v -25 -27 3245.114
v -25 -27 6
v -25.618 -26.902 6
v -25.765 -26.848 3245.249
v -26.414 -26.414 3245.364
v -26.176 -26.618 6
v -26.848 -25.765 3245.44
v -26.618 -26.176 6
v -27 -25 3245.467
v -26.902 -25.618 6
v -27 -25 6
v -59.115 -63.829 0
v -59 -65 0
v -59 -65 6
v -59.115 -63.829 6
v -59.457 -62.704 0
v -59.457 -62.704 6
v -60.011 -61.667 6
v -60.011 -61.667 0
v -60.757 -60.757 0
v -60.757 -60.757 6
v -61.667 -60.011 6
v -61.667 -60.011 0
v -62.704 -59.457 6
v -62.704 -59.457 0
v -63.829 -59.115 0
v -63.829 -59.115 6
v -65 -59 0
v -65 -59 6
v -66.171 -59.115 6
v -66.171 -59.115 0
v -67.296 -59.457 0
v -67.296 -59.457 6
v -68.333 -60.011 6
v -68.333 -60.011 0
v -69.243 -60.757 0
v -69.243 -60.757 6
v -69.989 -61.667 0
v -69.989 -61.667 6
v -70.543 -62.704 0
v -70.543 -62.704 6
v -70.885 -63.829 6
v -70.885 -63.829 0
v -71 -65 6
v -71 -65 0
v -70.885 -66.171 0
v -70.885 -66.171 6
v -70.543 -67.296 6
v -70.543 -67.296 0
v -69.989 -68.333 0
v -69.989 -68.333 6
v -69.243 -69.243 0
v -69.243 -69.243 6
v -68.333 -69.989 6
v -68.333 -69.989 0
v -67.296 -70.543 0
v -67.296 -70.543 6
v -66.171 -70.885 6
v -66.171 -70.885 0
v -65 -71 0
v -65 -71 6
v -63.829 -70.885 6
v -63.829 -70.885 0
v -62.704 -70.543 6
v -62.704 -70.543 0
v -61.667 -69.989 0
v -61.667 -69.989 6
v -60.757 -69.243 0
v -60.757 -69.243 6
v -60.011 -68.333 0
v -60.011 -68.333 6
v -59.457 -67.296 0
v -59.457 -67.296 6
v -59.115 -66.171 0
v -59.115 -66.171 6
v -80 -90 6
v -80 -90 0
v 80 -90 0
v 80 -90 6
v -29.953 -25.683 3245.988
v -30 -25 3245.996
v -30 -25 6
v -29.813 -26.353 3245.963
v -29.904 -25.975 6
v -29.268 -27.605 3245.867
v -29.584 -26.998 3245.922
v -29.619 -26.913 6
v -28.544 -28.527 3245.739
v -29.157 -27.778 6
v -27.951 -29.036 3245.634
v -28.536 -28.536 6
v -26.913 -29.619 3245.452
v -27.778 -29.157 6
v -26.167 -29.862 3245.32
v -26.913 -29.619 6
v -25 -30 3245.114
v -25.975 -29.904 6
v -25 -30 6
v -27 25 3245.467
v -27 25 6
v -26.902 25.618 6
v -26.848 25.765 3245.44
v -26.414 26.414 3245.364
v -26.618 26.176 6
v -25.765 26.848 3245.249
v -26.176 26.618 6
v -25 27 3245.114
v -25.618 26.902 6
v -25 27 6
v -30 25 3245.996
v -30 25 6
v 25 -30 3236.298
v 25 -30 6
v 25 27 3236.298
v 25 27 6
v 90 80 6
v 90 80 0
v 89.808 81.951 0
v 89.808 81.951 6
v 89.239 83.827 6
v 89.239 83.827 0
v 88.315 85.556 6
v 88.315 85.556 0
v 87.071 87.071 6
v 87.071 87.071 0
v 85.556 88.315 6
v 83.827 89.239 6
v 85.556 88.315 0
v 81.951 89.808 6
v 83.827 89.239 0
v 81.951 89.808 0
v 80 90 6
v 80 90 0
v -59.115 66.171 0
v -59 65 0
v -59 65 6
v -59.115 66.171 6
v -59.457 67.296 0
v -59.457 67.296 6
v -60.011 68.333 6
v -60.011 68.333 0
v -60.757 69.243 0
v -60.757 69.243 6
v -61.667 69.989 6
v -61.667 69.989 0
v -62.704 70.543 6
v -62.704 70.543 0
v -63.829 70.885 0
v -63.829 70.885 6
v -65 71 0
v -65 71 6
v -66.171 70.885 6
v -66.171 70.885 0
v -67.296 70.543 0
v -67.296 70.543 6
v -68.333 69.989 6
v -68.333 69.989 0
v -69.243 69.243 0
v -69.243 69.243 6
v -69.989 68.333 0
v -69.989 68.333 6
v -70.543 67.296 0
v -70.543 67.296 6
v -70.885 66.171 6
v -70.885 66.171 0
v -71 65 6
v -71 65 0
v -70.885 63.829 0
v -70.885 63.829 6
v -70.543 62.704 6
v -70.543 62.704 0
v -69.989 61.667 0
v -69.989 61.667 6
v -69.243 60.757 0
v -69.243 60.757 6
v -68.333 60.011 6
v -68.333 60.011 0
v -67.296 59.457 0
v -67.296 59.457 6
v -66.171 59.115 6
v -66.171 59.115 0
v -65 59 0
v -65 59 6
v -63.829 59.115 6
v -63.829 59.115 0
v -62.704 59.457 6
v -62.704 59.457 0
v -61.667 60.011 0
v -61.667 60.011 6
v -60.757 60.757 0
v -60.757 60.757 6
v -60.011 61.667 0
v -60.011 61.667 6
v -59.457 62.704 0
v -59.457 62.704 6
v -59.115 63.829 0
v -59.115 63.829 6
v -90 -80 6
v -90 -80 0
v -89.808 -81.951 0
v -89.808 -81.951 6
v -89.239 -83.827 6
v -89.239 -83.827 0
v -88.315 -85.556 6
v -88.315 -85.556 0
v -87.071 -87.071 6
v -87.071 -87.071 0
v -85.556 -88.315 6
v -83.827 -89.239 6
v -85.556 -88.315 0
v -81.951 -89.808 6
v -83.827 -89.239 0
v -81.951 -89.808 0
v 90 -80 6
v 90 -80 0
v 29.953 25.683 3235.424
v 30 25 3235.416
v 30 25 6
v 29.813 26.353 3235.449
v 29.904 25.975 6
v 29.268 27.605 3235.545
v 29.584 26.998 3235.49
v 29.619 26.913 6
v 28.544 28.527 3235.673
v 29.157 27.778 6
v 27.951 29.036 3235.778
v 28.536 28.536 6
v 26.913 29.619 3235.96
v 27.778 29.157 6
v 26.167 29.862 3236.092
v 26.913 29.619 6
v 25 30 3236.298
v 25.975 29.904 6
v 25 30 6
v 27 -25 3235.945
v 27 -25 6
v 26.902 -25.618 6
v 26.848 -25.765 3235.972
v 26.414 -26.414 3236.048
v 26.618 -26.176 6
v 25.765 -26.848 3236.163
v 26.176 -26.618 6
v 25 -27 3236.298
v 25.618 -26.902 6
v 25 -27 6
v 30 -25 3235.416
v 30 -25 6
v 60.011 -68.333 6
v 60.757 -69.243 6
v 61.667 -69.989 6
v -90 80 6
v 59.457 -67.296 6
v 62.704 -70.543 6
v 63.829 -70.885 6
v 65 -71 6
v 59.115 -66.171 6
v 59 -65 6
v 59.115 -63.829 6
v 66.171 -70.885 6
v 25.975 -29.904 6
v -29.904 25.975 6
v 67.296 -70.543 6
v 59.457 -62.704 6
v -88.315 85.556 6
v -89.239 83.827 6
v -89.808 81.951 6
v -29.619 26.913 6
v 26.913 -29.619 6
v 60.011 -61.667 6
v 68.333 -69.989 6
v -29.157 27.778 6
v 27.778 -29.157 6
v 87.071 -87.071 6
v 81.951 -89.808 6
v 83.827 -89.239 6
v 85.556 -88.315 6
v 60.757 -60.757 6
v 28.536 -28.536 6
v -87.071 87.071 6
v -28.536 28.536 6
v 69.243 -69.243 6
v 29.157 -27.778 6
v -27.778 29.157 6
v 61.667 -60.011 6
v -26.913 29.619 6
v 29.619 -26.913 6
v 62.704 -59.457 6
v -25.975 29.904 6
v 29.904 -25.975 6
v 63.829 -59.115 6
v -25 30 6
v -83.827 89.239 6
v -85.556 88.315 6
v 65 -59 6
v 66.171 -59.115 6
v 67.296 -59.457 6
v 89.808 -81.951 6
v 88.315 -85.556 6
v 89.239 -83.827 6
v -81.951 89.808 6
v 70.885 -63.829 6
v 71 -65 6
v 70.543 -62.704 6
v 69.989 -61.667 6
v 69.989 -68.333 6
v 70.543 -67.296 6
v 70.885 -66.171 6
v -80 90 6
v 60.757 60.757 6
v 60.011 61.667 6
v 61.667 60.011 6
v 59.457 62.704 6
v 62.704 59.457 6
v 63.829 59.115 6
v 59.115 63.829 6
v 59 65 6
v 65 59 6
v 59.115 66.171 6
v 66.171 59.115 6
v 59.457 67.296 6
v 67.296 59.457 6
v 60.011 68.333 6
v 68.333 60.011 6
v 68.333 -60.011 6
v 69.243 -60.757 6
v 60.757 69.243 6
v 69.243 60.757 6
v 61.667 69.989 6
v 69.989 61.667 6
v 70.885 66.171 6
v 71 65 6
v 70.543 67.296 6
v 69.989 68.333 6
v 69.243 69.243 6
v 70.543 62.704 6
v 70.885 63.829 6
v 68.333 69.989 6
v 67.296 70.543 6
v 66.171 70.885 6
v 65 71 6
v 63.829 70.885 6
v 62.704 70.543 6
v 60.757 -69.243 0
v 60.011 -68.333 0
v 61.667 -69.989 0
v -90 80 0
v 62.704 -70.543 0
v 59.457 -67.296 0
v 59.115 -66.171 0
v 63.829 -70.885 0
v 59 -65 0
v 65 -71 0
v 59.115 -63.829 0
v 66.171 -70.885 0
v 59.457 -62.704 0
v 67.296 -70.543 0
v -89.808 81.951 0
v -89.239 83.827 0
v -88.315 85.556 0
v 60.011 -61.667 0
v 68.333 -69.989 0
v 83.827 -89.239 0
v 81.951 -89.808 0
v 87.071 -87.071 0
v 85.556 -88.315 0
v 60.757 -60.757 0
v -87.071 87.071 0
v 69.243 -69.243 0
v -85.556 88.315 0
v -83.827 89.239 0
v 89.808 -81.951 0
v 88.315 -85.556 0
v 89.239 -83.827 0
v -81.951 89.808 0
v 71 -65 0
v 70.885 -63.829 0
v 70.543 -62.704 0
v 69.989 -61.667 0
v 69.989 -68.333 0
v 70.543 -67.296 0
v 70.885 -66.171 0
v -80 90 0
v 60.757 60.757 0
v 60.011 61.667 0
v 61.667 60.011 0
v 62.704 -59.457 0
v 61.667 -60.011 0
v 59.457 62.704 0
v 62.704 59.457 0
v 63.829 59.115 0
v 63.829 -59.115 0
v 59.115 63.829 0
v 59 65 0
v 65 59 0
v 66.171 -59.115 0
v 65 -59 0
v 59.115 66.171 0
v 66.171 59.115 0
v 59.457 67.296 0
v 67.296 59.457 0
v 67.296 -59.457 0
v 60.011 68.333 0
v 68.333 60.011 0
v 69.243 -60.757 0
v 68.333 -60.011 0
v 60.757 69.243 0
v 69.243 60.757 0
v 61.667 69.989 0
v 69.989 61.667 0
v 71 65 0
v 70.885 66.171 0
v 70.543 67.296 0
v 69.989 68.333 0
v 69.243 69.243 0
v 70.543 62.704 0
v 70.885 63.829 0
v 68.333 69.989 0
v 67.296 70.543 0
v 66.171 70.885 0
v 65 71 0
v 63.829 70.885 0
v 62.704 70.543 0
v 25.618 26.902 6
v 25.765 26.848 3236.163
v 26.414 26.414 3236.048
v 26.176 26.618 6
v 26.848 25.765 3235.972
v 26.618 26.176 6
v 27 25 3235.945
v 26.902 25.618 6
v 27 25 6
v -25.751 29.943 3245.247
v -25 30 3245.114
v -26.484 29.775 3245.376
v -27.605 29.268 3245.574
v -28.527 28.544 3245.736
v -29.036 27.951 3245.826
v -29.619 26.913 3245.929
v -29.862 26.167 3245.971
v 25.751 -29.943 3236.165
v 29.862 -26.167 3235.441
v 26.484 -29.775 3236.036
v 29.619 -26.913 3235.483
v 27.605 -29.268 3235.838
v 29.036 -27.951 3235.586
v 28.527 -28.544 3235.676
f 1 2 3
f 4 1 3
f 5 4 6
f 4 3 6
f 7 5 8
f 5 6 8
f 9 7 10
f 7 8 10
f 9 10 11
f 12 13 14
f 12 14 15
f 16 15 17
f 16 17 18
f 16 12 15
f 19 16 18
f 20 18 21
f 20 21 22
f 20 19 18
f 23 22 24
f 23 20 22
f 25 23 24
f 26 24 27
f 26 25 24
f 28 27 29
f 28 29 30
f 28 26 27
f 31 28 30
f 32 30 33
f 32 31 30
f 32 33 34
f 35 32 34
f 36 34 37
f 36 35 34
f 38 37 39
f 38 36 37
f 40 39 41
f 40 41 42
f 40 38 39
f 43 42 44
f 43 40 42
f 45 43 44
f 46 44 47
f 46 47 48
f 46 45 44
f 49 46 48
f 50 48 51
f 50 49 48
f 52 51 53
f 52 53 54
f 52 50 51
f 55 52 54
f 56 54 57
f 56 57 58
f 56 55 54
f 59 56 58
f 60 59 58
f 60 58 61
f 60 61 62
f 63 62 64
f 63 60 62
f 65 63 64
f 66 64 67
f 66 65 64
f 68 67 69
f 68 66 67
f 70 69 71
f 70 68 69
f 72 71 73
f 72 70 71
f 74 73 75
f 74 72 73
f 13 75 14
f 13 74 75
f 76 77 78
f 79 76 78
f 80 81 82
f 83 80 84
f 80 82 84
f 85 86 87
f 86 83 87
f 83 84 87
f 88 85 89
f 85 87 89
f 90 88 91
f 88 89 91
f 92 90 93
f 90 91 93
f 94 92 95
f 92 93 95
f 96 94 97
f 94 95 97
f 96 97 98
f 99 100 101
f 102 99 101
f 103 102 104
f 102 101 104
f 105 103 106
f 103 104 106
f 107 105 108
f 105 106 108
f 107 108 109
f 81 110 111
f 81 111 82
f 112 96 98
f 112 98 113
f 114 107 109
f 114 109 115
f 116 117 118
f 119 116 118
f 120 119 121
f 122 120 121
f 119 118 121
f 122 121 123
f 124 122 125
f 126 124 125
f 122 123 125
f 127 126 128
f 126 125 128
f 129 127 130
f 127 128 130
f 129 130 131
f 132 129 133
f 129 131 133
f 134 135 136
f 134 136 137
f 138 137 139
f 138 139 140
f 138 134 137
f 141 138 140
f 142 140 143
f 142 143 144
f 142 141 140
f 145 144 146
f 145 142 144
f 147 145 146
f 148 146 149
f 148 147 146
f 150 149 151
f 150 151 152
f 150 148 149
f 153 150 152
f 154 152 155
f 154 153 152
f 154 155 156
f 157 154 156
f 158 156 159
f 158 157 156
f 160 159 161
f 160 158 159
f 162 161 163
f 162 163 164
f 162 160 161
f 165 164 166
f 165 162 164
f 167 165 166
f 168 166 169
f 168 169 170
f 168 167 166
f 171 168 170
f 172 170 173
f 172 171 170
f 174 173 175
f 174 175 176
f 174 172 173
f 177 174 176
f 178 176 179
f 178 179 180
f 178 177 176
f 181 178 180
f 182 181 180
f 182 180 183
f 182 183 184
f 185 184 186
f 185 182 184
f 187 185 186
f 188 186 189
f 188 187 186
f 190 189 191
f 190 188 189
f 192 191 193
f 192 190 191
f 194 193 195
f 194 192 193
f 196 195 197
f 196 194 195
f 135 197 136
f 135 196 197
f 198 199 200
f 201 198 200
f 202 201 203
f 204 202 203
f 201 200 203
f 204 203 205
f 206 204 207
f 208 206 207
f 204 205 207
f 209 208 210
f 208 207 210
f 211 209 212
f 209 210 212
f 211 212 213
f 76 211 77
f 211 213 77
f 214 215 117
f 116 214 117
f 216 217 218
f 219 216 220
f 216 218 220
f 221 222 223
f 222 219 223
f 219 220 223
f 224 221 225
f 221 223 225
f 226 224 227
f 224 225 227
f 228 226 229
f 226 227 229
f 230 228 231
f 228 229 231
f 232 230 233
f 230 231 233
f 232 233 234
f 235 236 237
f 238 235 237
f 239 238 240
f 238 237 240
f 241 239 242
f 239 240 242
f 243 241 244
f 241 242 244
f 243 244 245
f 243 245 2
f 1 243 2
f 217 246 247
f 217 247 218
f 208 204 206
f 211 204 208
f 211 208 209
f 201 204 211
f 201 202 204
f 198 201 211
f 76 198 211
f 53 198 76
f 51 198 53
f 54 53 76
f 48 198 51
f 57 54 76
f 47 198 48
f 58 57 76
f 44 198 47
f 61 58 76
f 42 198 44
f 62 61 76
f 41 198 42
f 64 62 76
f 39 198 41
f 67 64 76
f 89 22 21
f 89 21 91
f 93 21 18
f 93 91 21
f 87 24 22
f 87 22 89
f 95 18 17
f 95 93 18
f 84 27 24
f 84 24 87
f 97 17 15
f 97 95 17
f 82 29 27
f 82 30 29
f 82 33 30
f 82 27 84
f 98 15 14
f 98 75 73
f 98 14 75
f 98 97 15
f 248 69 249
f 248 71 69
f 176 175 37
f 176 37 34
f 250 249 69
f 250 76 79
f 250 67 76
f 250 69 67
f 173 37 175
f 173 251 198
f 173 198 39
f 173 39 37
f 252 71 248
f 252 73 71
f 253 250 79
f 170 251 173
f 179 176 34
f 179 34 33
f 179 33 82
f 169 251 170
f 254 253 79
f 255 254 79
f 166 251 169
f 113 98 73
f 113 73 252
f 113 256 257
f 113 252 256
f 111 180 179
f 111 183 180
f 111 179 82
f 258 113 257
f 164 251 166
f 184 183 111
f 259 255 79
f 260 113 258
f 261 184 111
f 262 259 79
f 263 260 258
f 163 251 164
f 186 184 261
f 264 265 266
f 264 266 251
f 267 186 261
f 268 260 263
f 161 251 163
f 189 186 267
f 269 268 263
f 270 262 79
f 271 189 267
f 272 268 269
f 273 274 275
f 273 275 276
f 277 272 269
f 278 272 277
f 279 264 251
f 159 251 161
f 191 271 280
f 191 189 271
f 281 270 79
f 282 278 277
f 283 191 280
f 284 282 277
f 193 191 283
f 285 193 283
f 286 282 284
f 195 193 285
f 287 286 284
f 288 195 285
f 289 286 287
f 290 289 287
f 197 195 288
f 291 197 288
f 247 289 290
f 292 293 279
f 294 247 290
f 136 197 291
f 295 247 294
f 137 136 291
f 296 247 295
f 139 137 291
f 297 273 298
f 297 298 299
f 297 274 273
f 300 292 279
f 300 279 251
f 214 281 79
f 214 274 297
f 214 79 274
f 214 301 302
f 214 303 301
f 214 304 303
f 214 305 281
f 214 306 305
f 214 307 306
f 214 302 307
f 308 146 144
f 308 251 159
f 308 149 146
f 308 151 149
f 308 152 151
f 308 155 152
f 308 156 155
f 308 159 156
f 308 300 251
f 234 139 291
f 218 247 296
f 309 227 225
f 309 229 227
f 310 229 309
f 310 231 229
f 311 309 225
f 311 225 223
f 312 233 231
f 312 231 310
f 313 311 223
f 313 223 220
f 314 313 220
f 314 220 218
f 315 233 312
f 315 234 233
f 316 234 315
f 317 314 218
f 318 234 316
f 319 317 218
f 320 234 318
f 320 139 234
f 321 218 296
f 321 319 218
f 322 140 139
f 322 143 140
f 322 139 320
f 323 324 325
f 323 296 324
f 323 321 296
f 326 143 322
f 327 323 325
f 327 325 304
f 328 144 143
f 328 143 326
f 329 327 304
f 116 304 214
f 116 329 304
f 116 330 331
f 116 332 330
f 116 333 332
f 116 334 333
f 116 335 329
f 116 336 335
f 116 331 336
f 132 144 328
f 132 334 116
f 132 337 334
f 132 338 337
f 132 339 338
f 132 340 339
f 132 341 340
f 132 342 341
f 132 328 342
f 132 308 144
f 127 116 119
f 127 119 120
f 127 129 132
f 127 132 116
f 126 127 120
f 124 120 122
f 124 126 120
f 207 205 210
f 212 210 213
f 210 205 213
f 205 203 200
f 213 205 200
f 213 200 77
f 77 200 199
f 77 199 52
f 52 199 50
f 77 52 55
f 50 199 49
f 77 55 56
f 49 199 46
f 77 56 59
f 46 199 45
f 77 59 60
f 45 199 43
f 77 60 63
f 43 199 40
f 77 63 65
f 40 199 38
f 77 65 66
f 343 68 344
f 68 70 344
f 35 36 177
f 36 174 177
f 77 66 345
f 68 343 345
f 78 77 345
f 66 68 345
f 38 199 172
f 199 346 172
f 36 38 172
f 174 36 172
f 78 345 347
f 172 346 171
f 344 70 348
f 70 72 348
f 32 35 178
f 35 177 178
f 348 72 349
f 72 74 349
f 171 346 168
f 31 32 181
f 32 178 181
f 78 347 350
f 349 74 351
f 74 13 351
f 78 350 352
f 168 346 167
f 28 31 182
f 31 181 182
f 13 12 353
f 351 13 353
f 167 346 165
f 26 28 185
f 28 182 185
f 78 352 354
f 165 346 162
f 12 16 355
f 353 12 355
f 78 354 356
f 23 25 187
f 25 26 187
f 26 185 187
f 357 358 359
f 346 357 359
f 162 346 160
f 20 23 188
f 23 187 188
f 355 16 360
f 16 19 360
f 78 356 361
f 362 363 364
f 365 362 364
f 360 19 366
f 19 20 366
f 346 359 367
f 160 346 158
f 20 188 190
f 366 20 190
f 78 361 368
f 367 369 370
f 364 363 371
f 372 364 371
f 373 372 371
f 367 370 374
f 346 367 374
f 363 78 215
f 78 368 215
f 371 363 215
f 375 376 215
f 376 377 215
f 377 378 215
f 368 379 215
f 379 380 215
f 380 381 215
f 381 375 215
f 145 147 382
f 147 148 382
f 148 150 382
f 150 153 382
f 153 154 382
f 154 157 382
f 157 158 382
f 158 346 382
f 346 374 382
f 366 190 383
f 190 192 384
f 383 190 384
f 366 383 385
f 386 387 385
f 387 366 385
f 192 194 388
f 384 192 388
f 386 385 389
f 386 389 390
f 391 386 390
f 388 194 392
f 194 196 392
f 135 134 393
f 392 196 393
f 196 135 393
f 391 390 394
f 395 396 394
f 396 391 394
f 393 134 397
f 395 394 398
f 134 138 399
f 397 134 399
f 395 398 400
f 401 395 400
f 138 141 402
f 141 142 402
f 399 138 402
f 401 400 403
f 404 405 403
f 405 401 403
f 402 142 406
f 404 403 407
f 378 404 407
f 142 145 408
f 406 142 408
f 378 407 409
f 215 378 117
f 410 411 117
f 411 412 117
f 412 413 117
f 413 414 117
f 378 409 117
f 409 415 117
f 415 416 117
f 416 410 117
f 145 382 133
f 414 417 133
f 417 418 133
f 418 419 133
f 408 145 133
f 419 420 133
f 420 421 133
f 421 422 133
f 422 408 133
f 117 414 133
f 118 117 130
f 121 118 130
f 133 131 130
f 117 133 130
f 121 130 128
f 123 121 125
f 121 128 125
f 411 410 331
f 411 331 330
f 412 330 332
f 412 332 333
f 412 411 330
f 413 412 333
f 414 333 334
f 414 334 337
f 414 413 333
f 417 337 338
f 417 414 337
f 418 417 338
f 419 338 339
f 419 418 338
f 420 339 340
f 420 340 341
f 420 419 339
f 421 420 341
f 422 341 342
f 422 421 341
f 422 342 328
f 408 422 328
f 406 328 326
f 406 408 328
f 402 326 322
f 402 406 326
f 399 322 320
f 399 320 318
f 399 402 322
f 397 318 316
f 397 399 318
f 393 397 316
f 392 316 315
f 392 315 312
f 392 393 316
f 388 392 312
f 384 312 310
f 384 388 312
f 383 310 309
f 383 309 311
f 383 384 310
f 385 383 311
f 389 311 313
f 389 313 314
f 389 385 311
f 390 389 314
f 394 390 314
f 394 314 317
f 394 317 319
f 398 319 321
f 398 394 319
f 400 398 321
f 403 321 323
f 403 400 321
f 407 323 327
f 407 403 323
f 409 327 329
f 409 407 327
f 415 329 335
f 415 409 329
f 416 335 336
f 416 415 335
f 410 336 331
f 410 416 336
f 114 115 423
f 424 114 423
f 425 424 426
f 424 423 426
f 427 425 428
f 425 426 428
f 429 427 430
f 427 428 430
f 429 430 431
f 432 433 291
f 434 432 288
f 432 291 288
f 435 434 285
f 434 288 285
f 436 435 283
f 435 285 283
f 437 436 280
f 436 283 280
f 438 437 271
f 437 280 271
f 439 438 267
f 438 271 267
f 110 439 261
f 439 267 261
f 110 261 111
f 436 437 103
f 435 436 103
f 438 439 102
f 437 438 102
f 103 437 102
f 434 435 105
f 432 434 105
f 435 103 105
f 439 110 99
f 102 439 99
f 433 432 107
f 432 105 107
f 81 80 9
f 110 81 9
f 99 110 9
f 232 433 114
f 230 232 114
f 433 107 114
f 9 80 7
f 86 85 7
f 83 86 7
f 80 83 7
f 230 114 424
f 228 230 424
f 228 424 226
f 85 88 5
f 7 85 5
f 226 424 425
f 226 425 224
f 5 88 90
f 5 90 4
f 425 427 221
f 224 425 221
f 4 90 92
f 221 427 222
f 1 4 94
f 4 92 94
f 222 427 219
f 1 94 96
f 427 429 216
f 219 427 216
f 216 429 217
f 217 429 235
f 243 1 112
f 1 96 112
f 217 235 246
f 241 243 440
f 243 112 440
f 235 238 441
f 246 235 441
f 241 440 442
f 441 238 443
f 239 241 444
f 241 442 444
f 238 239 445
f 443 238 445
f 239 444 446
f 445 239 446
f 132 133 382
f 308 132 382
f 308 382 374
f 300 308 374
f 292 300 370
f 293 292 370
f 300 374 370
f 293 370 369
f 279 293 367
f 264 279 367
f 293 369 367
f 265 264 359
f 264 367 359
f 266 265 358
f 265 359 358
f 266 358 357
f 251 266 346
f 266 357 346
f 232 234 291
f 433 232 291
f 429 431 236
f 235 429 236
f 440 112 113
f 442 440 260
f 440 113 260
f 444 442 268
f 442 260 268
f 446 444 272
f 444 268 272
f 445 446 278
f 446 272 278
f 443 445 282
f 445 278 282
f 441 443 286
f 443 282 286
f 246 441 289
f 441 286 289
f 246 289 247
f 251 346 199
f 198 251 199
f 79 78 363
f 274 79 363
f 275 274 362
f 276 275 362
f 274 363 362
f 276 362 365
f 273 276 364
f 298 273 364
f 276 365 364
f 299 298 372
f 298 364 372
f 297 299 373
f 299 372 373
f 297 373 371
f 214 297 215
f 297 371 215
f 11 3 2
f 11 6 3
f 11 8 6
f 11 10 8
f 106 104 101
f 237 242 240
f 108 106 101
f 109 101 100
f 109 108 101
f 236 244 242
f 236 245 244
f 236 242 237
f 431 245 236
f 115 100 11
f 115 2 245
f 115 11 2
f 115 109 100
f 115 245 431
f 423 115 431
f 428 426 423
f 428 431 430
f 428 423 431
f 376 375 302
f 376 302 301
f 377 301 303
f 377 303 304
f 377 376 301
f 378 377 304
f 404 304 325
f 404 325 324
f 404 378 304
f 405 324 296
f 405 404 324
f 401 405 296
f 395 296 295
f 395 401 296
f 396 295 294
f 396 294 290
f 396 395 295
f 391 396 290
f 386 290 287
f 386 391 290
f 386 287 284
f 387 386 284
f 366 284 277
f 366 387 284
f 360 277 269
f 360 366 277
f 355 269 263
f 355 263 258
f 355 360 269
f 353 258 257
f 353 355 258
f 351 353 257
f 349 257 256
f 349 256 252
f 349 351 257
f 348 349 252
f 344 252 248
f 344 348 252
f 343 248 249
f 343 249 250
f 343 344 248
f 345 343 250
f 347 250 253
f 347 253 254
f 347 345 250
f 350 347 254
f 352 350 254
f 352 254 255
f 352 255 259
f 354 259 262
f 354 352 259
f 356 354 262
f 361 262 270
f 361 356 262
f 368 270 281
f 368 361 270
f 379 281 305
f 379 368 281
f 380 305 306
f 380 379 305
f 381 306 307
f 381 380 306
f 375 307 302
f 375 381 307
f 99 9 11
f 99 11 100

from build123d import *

# Parameters (mm, degrees)
F0_R     = 6
F1_DEPTH = 6
F3_DEPTH = 3240
F5_DEPTH = 120.001


with BuildPart() as f1:
    # F0 (on Top) → F1 (new body)
    with BuildSketch(Plane.XY):
        with BuildLine():
            ThreePointArc((90, 80), (87.071068, 87.071068), (80, 90))
            Line((80, 90), (-80, 90))
            ThreePointArc((-80, 90), (-87.071068, 87.071068), (-90, 80))
            Line((-90, 80), (-90, -80))
            ThreePointArc((-90, -80), (-87.071068, -87.071068), (-80, -90))
            Line((-80, -90), (80, -90))
            ThreePointArc((80, -90), (87.071068, -87.071068), (90, -80))
            Line((90, -80), (90, 80))
        make_face()
        with Locations((-65, -65)):
            Circle(F0_R, mode=Mode.SUBTRACT)
        with Locations((65, -65)):
            Circle(F0_R, mode=Mode.SUBTRACT)
        with Locations((-65, 65)):
            Circle(F0_R, mode=Mode.SUBTRACT)
        with Locations((65, 65)):
            Circle(F0_R, mode=Mode.SUBTRACT)
    extrude(amount=F1_DEPTH)

    # F2 (on face) → F3 (join)
    with BuildSketch(Plane.XY.offset(6)):
        with BuildLine():
            Line((-25, -30), (25, -30))
            ThreePointArc((25, -30), (28.535534, -28.535534), (30, -25))
            Line((30, -25), (30, 25))
            ThreePointArc((30, 25), (28.535534, 28.535534), (25, 30))
            Line((25, 30), (-25, 30))
            ThreePointArc((-25, 30), (-28.535534, 28.535534), (-30, 25))
            Line((-30, 25), (-30, -25))
            ThreePointArc((-30, -25), (-28.535534, -28.535534), (-25, -30))
        make_face()
        with BuildLine():
            ThreePointArc((25, 27), (26.414214, 26.414214), (27, 25))
            Line((27, 25), (27, -25))
            ThreePointArc((27, -25), (26.414214, -26.414214), (25, -27))
            Line((25, -27), (-25, -27))
            ThreePointArc((-25, -27), (-26.414214, -26.414214), (-27, -25))
            Line((-27, -25), (-27, 25))
            ThreePointArc((-27, 25), (-26.414214, 26.414214), (-25, 27))
            Line((-25, 27), (25, 27))
        make_face(mode=Mode.SUBTRACT)
    extrude(amount=F3_DEPTH)

    # F4 (on face) → F5 (cut, through all)
    with BuildSketch(Plane.XZ.offset(30)):
        Polygon((31.369732, 3246), (-30.02377, 3246), (31.369732, 3235.174669), align=None)
    extrude(amount=-F5_DEPTH, mode=Mode.SUBTRACT)


solid = f1.part
